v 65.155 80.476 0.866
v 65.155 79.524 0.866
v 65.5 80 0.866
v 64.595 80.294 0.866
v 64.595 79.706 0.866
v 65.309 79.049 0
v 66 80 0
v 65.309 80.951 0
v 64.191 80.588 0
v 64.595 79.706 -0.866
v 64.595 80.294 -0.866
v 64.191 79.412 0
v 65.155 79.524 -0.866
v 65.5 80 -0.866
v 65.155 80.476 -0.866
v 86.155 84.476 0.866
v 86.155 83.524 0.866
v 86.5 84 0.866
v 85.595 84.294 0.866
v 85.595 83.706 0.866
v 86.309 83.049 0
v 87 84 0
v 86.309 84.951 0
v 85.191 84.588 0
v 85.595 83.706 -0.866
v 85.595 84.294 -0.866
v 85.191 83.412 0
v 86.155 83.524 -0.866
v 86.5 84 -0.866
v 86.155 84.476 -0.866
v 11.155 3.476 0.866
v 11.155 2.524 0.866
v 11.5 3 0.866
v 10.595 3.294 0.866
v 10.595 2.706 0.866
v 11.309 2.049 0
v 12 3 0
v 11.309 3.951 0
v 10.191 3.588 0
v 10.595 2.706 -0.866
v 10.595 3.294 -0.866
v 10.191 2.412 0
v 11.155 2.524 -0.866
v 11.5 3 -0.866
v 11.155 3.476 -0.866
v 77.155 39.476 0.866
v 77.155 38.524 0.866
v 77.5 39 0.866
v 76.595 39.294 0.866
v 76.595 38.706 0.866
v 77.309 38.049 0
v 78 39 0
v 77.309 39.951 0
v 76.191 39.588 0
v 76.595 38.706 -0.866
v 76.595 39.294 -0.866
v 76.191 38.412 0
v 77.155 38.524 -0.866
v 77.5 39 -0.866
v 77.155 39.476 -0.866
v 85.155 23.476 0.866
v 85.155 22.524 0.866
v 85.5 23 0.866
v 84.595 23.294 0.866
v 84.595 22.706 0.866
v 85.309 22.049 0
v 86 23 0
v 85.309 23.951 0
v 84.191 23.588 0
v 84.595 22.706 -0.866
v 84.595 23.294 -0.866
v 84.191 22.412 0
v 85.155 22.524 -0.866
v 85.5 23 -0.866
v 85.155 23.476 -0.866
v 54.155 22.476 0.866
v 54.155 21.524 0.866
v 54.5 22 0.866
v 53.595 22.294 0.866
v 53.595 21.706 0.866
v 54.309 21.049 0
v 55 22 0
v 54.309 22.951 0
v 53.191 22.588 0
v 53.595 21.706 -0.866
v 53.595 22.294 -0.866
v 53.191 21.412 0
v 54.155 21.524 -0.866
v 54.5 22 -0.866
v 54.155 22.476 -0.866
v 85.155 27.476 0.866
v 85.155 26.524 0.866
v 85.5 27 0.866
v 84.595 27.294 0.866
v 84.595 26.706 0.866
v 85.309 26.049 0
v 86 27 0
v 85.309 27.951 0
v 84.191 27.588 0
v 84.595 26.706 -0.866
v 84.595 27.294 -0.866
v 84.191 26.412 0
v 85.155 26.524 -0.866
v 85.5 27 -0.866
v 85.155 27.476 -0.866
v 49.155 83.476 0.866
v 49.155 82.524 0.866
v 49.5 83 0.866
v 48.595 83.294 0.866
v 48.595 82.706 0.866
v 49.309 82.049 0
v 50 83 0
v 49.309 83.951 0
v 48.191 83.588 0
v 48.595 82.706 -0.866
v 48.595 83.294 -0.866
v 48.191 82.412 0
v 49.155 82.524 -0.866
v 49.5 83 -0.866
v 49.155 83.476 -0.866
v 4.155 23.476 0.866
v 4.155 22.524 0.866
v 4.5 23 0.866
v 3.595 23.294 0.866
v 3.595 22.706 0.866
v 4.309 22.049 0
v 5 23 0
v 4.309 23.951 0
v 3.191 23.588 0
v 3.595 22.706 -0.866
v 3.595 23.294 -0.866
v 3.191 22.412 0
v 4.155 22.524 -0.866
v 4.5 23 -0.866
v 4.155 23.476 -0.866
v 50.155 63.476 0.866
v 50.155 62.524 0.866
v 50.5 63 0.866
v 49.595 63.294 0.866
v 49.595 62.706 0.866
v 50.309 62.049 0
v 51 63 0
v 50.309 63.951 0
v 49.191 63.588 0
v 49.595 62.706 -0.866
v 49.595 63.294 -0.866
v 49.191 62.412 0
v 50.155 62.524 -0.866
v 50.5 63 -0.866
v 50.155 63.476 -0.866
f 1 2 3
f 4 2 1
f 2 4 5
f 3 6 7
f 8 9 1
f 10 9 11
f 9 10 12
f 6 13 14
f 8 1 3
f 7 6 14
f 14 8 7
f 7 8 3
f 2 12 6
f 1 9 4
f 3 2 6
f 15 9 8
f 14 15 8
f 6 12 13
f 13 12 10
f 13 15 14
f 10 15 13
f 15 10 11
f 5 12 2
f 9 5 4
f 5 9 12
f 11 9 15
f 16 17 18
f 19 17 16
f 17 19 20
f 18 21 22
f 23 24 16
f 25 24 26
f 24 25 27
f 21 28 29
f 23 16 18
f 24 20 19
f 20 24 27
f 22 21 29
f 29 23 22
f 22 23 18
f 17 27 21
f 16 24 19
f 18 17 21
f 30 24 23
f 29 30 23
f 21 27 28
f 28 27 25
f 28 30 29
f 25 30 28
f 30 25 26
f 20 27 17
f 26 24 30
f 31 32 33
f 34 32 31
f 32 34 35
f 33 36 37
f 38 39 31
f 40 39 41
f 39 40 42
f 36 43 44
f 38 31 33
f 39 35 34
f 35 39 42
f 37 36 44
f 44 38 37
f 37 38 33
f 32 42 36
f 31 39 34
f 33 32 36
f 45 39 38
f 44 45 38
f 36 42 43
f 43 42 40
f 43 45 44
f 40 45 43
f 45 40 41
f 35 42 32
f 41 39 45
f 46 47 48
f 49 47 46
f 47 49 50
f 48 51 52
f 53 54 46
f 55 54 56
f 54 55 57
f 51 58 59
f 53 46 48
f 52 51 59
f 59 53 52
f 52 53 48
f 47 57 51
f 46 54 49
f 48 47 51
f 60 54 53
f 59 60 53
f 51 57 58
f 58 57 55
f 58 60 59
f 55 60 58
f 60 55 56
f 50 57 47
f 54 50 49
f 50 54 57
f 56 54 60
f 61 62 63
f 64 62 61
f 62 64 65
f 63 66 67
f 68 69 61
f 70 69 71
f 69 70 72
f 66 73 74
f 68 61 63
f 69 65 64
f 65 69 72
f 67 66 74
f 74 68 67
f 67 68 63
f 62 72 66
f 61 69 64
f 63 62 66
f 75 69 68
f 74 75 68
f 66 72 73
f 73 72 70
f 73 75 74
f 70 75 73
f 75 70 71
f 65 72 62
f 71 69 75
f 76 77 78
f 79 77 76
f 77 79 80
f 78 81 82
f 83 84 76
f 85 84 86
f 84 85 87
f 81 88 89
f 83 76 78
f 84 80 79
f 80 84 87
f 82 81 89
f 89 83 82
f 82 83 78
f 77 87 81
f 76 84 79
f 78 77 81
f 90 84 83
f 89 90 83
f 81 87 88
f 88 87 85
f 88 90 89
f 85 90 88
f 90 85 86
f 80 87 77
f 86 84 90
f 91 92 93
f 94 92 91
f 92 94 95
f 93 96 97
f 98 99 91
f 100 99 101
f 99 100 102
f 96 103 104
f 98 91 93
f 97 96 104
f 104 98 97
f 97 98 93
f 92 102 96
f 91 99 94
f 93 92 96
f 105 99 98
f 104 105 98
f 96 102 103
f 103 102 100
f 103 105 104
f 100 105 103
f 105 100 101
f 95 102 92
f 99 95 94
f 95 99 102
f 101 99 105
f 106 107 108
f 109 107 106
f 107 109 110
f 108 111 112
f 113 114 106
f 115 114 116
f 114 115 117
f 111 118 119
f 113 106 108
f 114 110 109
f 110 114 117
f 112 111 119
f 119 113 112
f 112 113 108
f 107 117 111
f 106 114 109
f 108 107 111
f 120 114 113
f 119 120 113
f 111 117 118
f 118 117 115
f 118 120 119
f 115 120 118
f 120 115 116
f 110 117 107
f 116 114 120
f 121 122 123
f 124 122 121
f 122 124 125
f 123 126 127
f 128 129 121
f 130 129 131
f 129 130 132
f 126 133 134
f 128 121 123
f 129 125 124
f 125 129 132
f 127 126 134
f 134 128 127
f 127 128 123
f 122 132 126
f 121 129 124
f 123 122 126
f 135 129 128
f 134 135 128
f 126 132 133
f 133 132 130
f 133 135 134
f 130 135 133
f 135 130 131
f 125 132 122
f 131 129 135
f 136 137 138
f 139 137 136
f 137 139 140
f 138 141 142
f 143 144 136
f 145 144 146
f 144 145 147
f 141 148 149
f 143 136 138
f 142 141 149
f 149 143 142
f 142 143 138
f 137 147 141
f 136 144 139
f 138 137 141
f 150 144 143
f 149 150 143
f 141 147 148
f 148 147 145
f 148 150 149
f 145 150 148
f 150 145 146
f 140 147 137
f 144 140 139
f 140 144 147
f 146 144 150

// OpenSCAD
//median

function rnd_v(init_value,end_value)=round(rands(init_value,end_value,1)[0]);      
      
function rnd_points(width,length,amount)=
     [for(i=[0:amount-1])
        [rnd_v(0,width),rnd_v(0,length)]];
     
array=rnd_points(100,100,10) ;
         
for(i=array)
     translate(i)
         sphere(1);


function sort(list)=
     let(leng=len(list))
     leng<=1? list:
          let(
               pivot=list[0],
              
               before=[for(j=1;j<leng;j=j+1) 
               if(list[j]<pivot) 
                    list[j]],               
               after=[for(j=1;j<leng;j=j+1)
               if(list[j]>=pivot)
                    list[j]]       
               )               
     [each sort(before),pivot,each sort(after)];   
     
 array_x=sort([for(i=array)i.x]);
 array_y=sort([for(i=array)i.y]);    
              
               
function midian(array_x,array_y)=
     let(amount=len(array_x))
     let(x=
     amount%2==0?
     (array_x[amount/2]+array_x[amount/2+1])/2:
     array_x[round(amount/2)])
     
     let(y=
     amount%2==0?
     (array_y[amount/2]+array_y[amount/2+1])/2:
     array_y[round(amount/2)])
     [x,y];
 
 
 echo(midian(array_x,array_y));
     
     
 
     
     
   
     
     
     
     
     
     
     
     
     
     
     
     
